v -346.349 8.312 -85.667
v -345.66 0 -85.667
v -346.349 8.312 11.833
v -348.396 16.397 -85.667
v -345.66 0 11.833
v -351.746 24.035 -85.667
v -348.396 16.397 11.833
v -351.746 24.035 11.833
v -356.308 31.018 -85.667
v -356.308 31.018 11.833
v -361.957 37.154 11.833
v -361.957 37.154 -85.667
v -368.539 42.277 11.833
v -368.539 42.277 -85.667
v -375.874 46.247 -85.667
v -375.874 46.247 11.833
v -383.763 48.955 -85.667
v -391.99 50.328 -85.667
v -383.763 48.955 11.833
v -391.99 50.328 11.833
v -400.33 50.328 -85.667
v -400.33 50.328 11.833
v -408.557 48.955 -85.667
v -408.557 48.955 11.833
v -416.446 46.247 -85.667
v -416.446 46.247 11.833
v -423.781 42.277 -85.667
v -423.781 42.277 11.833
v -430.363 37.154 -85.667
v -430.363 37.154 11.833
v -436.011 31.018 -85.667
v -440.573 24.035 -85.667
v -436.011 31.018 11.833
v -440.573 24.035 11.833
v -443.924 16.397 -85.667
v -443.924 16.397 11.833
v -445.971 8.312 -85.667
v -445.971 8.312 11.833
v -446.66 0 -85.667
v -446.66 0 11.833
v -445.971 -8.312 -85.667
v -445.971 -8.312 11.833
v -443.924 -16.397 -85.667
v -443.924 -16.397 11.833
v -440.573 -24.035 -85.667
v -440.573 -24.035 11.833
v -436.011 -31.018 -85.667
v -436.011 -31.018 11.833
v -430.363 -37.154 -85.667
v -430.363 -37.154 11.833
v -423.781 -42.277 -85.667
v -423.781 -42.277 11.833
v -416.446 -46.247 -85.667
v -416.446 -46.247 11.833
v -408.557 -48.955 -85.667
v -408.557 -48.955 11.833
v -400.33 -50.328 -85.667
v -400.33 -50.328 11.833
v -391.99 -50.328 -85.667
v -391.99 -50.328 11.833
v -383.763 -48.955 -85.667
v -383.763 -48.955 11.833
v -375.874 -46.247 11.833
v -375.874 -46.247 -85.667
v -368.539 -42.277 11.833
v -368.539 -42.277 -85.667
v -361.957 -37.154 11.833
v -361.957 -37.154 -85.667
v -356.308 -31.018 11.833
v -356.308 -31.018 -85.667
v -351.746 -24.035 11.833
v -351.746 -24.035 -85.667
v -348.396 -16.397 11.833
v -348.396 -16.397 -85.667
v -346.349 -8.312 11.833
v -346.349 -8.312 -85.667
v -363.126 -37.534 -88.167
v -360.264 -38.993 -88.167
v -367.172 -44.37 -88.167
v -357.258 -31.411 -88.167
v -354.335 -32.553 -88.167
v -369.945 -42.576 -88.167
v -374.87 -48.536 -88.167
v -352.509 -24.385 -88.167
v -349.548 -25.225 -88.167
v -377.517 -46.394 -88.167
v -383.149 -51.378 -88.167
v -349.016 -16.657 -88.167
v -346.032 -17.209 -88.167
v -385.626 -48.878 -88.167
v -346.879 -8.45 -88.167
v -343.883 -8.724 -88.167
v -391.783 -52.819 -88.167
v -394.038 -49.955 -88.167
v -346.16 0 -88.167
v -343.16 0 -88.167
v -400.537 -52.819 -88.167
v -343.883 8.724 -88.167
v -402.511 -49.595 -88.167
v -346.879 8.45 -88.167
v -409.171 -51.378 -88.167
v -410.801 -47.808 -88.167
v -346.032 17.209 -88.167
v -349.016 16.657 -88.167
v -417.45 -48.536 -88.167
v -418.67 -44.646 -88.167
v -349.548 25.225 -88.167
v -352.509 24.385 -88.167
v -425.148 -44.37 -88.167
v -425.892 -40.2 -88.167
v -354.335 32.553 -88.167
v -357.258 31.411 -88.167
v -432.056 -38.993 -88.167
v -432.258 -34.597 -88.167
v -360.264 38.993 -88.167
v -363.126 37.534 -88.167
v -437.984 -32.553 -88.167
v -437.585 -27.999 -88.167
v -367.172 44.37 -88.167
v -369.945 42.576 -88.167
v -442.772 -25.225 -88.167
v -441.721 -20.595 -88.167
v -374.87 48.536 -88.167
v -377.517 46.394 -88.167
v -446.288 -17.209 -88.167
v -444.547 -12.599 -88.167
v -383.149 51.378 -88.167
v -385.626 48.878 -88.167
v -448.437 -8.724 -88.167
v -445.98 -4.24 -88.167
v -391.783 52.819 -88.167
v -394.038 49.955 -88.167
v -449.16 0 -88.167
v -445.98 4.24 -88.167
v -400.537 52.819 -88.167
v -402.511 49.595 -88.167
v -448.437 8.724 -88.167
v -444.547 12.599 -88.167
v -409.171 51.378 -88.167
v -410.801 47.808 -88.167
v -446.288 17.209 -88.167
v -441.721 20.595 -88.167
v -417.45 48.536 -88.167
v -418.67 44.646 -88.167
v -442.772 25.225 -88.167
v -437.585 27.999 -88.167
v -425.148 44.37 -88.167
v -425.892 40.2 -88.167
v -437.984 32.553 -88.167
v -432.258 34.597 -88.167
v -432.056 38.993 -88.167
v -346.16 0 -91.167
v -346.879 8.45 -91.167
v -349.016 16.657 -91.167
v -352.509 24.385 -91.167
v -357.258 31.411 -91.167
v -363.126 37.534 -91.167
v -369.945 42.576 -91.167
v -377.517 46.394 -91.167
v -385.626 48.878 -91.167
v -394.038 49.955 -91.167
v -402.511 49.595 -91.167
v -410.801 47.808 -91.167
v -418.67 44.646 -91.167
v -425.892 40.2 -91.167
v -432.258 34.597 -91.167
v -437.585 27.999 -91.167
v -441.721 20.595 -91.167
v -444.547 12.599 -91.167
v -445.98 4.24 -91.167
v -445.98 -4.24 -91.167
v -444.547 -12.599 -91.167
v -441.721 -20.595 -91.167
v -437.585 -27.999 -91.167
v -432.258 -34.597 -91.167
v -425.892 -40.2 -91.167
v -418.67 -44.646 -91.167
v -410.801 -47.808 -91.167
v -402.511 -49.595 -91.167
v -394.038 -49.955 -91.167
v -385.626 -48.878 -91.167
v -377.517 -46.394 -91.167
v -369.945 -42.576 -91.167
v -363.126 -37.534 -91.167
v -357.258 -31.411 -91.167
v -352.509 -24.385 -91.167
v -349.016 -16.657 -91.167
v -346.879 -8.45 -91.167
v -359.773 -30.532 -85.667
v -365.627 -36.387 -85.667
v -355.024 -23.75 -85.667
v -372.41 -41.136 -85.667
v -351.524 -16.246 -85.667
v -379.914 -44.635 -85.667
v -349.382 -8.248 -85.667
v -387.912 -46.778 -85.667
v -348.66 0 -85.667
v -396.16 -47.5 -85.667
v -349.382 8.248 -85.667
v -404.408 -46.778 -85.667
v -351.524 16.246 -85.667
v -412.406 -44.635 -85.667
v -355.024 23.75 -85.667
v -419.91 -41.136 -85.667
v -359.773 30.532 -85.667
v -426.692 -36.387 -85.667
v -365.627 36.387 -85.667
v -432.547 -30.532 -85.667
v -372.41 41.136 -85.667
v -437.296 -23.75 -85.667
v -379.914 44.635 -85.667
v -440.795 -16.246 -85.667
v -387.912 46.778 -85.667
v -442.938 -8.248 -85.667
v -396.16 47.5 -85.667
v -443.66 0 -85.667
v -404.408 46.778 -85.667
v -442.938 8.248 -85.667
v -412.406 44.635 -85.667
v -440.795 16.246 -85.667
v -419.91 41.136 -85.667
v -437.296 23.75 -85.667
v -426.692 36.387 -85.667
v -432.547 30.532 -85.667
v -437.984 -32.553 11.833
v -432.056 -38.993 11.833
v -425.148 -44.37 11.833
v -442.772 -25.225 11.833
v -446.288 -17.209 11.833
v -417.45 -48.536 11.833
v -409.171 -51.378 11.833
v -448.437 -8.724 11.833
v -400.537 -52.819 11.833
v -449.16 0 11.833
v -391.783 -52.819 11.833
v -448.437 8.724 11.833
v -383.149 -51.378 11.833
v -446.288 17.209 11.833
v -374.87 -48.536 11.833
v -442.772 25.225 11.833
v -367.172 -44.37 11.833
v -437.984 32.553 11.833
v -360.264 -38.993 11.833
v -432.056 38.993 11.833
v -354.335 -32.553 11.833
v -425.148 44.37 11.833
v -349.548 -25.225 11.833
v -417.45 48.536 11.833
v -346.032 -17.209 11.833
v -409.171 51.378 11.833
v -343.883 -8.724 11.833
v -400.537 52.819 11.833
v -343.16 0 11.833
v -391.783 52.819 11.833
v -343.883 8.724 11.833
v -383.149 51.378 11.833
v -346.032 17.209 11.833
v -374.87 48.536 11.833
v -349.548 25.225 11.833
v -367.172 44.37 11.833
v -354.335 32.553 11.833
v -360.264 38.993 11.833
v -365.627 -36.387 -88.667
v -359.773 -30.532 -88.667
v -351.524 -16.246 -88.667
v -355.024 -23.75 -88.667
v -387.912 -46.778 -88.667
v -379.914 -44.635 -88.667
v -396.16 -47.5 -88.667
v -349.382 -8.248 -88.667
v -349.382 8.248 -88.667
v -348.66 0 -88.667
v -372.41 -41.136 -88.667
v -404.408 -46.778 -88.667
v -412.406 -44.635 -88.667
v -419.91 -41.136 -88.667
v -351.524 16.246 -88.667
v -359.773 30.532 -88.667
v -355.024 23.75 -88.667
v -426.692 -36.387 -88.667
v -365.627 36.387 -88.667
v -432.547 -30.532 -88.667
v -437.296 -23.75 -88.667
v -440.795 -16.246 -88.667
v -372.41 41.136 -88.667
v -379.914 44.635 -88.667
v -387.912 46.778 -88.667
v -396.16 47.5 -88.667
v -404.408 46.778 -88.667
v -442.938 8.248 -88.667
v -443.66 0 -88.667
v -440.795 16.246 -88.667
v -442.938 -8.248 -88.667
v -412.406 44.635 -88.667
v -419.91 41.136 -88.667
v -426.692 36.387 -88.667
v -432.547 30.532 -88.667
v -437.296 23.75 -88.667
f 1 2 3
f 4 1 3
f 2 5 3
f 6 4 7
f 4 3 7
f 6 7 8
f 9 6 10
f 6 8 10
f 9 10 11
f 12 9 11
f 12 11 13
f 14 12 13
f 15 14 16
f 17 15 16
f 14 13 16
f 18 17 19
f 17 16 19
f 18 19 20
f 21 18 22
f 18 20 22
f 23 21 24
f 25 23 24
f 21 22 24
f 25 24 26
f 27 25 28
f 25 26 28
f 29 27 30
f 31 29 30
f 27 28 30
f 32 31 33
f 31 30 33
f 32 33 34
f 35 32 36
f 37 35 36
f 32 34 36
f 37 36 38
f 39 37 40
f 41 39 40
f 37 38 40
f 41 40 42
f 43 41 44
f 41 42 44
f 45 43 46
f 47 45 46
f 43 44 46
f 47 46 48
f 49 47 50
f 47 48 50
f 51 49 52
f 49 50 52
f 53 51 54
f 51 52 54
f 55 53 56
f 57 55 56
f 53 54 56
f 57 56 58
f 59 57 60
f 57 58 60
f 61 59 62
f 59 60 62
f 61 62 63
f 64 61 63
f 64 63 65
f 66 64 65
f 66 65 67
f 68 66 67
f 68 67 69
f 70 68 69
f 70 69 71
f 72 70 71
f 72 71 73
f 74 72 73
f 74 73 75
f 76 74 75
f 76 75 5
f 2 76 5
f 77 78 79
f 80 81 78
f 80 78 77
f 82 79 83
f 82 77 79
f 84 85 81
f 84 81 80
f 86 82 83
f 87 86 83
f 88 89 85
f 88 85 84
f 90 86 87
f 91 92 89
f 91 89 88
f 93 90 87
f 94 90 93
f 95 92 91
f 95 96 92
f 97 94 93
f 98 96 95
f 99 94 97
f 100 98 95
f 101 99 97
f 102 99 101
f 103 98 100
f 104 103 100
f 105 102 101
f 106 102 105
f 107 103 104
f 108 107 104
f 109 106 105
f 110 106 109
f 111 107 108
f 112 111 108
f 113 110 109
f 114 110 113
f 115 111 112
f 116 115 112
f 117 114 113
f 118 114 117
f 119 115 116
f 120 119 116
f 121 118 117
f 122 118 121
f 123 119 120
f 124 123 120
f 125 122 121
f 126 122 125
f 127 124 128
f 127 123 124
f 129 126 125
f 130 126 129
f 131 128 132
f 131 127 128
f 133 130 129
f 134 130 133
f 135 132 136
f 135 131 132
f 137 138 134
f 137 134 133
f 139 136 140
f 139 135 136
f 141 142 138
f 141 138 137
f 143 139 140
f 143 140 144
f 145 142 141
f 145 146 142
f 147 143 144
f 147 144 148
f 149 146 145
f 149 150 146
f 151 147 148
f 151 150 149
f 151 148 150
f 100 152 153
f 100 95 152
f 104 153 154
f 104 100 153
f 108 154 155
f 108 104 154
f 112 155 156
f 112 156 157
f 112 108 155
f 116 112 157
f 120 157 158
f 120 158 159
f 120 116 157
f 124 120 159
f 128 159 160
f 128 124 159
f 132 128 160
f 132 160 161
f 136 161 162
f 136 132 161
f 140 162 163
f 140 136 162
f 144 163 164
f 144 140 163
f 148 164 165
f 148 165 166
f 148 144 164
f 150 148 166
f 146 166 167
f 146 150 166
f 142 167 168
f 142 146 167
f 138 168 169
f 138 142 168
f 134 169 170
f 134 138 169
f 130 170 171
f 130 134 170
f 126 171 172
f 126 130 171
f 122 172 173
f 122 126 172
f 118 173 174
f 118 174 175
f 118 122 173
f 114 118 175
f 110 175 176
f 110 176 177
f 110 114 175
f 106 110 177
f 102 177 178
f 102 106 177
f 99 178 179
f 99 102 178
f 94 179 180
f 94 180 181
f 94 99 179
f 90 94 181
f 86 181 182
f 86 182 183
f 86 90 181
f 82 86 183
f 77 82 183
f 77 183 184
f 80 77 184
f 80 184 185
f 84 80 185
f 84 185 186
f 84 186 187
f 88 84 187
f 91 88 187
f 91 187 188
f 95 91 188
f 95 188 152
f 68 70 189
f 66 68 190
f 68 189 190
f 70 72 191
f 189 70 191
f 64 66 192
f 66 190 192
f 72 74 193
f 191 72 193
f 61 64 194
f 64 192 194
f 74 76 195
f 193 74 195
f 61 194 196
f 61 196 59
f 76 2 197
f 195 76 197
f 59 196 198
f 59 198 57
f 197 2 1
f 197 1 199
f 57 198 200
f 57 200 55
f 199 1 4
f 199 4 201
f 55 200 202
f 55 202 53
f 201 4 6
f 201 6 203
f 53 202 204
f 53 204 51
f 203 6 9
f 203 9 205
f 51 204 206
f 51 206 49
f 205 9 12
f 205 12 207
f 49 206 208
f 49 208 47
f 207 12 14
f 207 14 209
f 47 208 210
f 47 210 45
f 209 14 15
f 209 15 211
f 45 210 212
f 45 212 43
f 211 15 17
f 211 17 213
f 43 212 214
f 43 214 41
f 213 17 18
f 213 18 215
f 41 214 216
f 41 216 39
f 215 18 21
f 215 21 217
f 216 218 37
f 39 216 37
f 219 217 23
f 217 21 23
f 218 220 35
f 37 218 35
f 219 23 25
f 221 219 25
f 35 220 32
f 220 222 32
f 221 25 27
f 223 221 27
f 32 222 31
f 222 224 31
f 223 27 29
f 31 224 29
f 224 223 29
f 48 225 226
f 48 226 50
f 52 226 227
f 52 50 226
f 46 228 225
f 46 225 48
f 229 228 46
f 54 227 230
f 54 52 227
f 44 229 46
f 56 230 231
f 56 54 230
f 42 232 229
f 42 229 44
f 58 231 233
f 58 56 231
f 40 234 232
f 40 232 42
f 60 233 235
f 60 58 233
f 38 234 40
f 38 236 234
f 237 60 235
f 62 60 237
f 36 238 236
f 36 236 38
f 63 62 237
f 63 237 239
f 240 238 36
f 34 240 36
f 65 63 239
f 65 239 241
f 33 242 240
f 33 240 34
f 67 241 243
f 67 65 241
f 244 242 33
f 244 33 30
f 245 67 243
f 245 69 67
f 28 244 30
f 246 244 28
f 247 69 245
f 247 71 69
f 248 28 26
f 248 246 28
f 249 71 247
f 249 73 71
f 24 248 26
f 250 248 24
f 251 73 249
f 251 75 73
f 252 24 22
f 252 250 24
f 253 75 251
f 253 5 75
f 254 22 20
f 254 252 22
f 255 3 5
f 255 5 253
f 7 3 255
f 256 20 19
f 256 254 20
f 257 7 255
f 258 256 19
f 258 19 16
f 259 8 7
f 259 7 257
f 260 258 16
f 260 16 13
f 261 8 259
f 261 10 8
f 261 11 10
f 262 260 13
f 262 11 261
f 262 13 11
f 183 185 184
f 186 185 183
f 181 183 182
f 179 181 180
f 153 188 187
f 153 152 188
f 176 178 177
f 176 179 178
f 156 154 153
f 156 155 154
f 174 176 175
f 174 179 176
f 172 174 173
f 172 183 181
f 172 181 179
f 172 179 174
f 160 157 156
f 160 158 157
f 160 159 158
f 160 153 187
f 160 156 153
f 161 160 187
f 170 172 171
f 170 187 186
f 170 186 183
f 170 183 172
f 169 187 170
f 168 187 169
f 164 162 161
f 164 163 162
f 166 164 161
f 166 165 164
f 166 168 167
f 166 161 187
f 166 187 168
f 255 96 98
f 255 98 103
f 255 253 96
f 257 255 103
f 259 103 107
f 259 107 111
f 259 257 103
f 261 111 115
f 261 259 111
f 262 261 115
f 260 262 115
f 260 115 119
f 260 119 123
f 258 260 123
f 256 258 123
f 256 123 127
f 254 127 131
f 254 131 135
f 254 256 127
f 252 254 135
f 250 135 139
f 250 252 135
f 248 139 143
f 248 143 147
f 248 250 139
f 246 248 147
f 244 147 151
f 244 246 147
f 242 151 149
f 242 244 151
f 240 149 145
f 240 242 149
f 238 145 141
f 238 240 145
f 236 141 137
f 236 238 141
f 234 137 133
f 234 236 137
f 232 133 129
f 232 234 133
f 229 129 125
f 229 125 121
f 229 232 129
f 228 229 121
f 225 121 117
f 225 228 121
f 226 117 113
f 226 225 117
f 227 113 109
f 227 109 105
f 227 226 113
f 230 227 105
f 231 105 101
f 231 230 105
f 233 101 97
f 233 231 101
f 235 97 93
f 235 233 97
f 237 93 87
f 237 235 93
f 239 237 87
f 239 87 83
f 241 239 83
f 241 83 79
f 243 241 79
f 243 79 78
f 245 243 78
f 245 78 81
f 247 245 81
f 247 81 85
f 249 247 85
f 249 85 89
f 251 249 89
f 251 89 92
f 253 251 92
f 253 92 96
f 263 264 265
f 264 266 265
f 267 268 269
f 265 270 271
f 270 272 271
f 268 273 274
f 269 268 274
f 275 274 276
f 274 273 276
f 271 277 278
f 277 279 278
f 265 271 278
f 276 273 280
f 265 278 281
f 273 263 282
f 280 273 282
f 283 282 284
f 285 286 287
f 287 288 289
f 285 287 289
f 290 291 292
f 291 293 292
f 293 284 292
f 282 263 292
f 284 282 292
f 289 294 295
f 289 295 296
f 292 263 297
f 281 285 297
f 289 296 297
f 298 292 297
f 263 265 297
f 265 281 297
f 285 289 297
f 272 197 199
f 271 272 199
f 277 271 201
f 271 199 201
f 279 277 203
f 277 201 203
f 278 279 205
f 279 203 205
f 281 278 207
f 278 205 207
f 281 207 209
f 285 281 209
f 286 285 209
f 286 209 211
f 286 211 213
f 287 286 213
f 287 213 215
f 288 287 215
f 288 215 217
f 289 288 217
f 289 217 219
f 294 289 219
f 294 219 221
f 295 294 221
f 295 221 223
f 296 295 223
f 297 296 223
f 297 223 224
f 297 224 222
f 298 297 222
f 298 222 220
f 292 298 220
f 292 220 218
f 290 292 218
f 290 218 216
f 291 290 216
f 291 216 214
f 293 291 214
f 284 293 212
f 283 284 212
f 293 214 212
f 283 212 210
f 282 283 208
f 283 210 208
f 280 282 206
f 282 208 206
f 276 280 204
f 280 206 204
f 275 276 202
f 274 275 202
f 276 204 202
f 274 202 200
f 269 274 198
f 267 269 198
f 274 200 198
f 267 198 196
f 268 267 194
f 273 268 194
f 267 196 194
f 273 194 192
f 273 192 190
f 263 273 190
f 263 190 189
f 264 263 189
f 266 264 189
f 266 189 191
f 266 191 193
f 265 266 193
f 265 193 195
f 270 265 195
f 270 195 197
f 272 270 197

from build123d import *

# Parameters (mm, degrees)
F2_T = -2.5


with BuildPart() as f1:
    # F0 (on Front) → F1 (revolve)
    with BuildSketch(Plane.XZ):
        Polygon((-343.1598980381, -88.1673034342), (-343.1598980381, 11.8326965658), (-396.1598980381, 11.8326965658), (-396.1598980381, -91.1673034342), (-346.1598980381, -91.1673034342), (-346.1598980381, -88.1673034342), align=None)
    revolve(axis=Axis((-396.1598980381, 0, -39.6673034342), (0, 0, 1)))

    # F2
    f2_openings = [f1.faces().sort_by_distance(p)[0] for p in [
        (-396.159898, 0, 11.832697),
    ]]
    offset(amount=F2_T, openings=f2_openings, kind=Kind.INTERSECTION)


solid = f1.part
